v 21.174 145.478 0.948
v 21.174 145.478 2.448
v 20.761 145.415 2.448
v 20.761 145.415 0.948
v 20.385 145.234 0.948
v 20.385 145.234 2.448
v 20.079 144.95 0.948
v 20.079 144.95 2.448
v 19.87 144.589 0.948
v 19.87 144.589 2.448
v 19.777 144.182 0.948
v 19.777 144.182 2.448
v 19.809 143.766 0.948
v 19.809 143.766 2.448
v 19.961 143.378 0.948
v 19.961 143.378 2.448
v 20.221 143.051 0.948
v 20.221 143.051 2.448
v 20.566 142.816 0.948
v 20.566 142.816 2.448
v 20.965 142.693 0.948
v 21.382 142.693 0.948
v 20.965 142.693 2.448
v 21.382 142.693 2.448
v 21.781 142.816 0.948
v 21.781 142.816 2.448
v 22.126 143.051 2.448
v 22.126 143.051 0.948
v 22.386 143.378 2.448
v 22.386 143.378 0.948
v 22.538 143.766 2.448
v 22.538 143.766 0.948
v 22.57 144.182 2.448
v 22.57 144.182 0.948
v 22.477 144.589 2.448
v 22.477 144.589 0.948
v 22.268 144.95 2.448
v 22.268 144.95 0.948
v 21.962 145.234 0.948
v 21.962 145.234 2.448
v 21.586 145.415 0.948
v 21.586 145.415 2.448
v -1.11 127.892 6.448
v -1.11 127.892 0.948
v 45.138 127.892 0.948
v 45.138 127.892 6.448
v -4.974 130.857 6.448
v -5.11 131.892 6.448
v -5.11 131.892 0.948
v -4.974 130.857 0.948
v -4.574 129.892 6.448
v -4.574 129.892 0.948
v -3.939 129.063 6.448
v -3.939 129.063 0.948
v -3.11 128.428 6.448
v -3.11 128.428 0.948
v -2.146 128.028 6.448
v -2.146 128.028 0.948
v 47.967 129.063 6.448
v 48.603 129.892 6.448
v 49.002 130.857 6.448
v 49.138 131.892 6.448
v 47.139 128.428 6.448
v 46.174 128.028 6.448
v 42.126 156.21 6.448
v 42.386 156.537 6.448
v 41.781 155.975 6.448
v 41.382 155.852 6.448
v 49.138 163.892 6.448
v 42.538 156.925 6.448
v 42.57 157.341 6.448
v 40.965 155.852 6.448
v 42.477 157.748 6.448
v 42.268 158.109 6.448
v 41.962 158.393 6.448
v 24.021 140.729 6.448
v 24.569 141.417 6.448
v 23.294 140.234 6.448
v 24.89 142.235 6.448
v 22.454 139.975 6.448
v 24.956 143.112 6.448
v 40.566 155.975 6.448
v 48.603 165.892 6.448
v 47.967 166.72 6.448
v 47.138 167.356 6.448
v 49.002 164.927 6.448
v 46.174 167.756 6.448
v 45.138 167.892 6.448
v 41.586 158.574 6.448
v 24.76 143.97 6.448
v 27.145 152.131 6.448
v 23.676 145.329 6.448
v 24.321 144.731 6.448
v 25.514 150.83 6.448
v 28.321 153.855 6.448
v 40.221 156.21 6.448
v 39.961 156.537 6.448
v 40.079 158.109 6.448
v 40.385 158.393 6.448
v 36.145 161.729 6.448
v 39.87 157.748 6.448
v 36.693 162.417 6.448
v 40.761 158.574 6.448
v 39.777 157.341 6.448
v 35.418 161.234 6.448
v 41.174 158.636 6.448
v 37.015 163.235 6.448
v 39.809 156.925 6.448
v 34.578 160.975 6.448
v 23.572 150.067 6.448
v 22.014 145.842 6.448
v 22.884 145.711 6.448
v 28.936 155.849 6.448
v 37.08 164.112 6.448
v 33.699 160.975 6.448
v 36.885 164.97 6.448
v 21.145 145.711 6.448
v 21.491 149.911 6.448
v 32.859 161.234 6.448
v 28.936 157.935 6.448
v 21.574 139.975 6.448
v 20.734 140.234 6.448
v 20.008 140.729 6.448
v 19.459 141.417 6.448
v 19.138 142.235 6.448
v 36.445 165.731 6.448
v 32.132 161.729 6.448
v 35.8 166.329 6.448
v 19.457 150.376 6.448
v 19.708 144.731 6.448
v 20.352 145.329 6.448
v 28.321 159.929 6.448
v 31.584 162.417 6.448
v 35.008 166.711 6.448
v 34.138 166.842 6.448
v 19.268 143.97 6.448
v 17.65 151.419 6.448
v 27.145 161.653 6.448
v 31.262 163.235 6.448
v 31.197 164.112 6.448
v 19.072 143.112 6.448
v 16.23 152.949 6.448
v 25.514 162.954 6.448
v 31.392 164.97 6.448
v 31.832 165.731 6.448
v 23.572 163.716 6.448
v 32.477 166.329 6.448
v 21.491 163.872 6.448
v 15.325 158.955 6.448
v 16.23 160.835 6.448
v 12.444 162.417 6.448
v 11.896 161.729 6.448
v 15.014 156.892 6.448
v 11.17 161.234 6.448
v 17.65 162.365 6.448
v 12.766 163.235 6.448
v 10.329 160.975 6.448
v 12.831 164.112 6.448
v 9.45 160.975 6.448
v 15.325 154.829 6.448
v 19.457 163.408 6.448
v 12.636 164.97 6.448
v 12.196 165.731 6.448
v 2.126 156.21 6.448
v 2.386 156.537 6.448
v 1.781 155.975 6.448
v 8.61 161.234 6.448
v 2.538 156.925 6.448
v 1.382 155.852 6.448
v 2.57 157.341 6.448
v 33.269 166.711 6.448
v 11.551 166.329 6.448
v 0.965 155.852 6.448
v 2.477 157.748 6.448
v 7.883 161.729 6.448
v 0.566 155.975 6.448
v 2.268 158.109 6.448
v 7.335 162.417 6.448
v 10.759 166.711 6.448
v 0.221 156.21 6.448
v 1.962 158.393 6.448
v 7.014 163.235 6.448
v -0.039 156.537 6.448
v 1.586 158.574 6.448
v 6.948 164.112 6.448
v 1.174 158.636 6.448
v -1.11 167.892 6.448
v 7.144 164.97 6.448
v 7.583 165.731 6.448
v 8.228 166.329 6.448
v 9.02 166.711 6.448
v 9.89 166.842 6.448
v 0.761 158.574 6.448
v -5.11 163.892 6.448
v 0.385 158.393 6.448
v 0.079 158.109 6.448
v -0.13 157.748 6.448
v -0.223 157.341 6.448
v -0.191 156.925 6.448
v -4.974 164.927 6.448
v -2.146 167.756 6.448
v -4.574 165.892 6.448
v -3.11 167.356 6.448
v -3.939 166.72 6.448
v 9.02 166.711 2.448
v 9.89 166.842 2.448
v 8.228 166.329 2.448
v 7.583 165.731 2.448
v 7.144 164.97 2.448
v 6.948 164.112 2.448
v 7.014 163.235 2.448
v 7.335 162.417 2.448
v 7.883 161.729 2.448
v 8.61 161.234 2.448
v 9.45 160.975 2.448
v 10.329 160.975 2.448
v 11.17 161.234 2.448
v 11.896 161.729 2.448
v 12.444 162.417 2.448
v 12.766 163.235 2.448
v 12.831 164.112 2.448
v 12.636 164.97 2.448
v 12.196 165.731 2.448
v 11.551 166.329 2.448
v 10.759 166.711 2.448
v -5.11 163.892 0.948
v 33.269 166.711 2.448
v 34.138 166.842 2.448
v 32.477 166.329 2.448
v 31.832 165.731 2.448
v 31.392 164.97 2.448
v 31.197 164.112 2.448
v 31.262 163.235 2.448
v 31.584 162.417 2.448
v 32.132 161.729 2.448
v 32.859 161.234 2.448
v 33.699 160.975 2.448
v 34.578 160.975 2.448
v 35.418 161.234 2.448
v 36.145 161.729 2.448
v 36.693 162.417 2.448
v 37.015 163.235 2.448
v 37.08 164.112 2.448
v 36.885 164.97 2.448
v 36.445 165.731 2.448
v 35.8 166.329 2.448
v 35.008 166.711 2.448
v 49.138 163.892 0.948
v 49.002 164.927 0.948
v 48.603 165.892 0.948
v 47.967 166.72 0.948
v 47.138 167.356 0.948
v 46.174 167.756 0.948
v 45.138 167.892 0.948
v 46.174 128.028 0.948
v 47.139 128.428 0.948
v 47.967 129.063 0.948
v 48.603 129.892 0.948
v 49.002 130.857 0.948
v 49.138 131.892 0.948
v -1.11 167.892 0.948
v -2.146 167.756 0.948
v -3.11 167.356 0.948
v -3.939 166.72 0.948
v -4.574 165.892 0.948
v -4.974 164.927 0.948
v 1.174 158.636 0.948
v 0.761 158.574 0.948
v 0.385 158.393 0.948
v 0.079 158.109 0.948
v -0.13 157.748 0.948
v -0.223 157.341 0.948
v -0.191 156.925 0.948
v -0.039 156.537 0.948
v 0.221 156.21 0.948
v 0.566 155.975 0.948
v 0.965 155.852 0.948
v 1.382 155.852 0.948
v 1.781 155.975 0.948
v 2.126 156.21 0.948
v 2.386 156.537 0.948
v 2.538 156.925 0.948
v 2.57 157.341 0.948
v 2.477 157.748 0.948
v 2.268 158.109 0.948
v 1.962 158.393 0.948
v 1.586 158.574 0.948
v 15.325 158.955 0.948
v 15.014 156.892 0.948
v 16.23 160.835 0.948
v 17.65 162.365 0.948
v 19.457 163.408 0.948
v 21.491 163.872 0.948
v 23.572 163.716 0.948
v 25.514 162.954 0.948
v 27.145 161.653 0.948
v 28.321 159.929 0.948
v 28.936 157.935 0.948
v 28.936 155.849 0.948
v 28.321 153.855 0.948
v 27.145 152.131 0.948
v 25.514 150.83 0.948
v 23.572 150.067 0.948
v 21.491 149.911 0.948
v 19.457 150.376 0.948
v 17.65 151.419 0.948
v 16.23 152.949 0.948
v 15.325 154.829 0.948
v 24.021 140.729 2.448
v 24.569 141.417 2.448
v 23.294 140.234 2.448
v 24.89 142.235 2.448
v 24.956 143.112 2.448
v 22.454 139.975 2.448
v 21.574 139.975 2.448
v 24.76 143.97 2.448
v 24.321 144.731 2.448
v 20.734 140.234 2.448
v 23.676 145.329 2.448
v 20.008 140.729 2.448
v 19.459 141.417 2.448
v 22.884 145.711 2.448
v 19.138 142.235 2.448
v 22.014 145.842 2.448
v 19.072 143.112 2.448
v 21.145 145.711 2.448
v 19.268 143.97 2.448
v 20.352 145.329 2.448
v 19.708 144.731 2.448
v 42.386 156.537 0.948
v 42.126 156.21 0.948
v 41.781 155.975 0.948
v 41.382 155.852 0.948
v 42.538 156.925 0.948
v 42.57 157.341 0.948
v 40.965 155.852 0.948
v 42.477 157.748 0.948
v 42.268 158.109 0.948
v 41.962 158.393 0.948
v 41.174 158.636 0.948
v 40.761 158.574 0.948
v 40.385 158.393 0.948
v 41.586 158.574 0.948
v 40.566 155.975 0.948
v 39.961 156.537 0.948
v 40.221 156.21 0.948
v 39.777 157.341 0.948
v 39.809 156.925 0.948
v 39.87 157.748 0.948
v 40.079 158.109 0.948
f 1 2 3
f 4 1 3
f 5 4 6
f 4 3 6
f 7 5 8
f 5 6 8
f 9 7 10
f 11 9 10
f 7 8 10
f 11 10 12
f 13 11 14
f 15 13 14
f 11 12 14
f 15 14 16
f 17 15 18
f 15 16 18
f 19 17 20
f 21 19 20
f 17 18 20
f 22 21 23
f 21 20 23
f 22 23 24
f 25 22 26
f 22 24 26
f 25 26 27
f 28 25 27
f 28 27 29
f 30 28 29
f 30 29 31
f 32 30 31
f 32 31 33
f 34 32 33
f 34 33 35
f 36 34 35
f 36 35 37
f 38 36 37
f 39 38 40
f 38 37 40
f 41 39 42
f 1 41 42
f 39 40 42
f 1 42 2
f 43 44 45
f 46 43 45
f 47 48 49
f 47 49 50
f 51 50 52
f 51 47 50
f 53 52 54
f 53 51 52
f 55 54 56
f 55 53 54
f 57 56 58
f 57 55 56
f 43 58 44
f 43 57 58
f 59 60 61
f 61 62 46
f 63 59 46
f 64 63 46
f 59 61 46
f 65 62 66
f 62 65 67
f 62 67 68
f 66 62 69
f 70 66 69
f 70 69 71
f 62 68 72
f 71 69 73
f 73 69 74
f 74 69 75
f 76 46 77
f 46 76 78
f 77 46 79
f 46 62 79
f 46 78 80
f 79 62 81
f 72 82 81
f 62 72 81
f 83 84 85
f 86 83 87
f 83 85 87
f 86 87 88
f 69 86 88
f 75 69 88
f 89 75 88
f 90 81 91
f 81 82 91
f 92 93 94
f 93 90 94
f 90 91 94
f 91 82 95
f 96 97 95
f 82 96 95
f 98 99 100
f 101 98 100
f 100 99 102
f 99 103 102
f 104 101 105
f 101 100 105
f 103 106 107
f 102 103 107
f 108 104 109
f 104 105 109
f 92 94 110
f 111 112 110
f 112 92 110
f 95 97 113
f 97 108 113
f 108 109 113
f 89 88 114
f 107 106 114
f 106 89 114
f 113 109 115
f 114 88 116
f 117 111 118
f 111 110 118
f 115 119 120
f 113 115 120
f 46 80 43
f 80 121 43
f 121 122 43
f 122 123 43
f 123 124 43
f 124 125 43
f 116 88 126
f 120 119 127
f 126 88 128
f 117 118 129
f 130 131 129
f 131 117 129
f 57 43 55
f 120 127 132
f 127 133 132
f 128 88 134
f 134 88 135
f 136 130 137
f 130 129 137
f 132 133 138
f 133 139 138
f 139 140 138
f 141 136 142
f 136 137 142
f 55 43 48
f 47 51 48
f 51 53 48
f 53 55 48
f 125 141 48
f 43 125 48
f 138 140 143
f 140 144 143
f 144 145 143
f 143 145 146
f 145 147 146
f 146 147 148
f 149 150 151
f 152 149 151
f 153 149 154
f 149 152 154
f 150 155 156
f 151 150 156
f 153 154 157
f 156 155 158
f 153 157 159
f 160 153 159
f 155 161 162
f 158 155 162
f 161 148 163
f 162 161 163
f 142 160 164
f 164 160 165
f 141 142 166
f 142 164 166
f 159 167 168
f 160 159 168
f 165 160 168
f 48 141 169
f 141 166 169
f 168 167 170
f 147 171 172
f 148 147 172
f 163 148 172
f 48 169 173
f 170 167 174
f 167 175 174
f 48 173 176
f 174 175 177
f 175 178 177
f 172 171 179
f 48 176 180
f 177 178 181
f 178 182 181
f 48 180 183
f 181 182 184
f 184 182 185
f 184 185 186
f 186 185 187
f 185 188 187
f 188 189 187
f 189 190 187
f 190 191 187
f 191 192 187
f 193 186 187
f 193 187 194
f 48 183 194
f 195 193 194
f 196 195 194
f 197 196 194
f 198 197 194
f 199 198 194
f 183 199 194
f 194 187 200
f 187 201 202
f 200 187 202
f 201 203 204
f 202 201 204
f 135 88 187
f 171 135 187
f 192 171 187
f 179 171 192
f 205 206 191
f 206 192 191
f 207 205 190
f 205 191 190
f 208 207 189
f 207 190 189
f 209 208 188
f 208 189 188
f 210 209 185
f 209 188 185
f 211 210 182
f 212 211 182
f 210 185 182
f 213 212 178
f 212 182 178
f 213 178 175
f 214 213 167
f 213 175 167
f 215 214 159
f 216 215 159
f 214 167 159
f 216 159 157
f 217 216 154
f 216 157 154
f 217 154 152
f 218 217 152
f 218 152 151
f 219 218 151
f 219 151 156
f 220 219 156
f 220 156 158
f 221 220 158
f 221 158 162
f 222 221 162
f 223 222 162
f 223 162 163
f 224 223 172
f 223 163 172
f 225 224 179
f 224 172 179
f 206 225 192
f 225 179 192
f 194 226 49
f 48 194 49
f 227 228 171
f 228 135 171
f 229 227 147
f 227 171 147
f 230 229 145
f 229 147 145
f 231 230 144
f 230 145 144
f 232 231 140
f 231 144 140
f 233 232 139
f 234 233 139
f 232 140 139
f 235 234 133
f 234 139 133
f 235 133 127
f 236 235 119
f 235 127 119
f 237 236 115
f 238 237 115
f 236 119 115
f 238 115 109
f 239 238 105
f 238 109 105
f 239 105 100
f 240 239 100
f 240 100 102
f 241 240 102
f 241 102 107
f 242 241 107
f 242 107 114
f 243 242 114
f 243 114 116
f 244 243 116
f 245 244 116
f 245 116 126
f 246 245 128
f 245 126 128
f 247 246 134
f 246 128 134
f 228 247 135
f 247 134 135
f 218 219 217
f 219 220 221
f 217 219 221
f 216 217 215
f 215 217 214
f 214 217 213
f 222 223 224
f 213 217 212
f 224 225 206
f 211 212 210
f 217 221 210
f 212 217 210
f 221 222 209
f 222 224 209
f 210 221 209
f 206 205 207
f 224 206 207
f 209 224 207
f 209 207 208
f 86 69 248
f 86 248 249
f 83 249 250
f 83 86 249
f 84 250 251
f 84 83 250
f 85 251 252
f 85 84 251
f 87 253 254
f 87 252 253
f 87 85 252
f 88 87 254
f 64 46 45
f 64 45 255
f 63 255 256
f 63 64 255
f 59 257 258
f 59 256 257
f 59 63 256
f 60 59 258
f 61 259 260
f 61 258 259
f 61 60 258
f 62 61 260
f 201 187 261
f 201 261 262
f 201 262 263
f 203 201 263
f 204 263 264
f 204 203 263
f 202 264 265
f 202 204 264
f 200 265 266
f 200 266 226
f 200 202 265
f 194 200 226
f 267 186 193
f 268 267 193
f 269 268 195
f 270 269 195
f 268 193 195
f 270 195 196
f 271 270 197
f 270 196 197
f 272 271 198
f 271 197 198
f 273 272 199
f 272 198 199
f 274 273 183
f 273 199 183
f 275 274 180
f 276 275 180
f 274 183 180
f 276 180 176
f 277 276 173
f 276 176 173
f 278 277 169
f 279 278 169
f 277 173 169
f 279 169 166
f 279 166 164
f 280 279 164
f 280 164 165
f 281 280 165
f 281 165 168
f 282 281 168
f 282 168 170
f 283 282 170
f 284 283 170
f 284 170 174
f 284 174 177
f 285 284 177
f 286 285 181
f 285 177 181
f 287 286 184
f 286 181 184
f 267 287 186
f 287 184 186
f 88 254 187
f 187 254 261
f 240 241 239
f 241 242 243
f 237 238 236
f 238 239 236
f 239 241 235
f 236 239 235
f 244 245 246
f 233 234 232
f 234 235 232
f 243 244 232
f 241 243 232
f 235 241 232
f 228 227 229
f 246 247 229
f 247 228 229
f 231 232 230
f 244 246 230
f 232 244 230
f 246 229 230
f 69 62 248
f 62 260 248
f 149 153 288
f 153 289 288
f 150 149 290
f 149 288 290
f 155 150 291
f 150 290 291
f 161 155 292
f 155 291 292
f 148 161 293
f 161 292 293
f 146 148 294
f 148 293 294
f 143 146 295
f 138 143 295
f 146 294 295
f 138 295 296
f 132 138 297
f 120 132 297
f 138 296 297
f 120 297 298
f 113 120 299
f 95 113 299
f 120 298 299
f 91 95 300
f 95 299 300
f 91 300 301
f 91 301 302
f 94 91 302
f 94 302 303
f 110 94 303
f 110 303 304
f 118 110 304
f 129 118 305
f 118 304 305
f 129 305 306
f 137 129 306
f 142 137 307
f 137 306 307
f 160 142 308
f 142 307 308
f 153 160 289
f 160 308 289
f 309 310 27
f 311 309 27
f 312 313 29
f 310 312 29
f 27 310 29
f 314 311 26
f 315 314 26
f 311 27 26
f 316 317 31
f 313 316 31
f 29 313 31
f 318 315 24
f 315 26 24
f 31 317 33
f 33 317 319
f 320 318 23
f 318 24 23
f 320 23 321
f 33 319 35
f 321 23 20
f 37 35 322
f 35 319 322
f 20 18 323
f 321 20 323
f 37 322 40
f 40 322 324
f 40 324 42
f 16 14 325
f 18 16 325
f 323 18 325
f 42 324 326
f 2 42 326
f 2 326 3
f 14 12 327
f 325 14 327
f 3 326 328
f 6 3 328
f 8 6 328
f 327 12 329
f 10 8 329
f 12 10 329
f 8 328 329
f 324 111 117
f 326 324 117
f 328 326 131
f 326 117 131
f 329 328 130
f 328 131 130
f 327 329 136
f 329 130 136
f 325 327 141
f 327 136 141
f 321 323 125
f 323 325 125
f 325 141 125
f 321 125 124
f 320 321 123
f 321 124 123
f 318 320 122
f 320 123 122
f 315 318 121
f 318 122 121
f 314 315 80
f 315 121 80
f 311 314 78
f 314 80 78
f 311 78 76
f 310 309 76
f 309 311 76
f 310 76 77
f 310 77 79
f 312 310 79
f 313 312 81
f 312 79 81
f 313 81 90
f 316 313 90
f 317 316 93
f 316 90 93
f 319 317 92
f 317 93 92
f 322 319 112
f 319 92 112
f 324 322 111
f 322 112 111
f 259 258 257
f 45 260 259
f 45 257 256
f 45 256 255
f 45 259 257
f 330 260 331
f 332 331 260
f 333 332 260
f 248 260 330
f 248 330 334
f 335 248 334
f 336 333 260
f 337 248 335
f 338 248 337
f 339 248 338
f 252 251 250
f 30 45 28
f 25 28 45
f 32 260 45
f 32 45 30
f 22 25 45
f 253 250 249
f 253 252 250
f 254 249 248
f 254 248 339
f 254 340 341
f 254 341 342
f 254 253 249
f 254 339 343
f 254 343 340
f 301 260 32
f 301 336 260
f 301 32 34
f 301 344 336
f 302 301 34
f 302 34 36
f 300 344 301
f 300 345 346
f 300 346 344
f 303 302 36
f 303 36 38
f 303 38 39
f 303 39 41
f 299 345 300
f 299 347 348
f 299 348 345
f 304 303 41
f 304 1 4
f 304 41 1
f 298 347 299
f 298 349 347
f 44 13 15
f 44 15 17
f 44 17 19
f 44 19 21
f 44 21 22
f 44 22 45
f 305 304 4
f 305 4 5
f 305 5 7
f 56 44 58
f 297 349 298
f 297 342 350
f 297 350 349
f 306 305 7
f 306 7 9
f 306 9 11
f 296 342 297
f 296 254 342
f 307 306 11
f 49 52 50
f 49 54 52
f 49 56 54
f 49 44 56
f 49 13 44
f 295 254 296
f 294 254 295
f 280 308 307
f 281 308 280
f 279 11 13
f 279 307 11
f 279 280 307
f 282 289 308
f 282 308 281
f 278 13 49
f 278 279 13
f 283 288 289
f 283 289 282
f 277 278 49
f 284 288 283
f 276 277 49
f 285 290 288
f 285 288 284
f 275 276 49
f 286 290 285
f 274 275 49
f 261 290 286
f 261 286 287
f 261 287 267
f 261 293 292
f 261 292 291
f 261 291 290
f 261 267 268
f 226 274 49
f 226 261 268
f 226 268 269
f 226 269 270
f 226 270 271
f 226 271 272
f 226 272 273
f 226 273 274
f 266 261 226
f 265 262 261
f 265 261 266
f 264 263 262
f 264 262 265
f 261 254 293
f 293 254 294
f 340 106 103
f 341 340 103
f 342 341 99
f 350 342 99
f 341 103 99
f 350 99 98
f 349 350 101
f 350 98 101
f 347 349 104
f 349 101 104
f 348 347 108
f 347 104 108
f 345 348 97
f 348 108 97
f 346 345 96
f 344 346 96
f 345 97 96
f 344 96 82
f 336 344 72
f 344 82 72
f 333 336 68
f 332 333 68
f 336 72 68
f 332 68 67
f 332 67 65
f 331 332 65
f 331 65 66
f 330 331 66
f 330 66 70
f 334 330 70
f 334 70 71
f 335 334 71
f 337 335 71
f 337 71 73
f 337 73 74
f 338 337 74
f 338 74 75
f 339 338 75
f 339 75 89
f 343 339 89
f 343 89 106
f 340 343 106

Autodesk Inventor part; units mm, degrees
ref_plane "YZ Plane" through (0, 0, 0) normal (1, 0, 0) x (0, 1, 0)
ref_plane "XZ Plane" through (0, 0, 0) normal (0, 1, 0) x (-1, 0, 0)
ref_plane "XY Plane" through (0, 0, 0) normal (0, 0, 1) x (1, 0, 0)
ref_plane "Work Plane1" through (52.5141, 202.7033, 6.4479) normal (0, 0, -1) x (0, 1, 0)
sketch "Sketch1" plane through (52.5141, 202.7033, 6.4479) normal (0, 0, -1) x (0, 1, 0)
  circle A0 centre (-59.8114, -30.5) radius 1.4 construction
  circle A1 centre (-38.8114, -18.3756) radius 1.4 projected
  circle A2 centre (-38.8114, -42.6244) radius 1.4 construction
  circle A3 centre (41, 0) radius 1.65 projected
  circle A4 centre (-9, 0) radius 1.65 projected
  circle A5 centre (-9, 50) radius 1.65 projected
  circle A6 centre (41, 50) radius 1.65 projected
  circle A7 centre (16, 50) radius 1.65 projected
  circle A8 centre (-9, 25) radius 1.65 projected
  circle A9 centre (16, 0) radius 1.65 projected
  circle A10 centre (41, 25) radius 1.65 projected
  line L0 (80, 55) -> (-80, 55) projected
  line L1 (-80, 55) -> (-80, -55) projected
  line L2 (-80, -55) -> (80, -55) projected
  line L3 (80, -55) -> (80, 55) projected
  line L4 (-36.5, 0) -> (-36.5, -50) projected
  line L5 (-14, 0) -> (-36.5, 0) projected
  line L6 (-14, -5) -> (-14, 0) projected
  line L7 (72, -5) -> (-14, -5) projected
  line L8 (72, -50) -> (72, -5) projected
  line L9 (-36.5, -50) -> (72, -50) projected
  line L10 (-4, 45) -> (-4, 5) projected
  line L11 (36, 45) -> (-4, 45) projected
  line L12 (36, 5) -> (36, 45) projected
  line L13 (-4, 5) -> (36, 5) projected
  line L14 (-64.5989, -17.0433) -> (-64.5989, -57.0433) construction
  line L15 (-64.5989, -57.0433) -> (-34.5989, -57.0433) construction
  line L16 (-34.5989, -57.0433) -> (-34.5989, -17.0433) construction
  line L17 (-34.5989, -17.0433) -> (-64.5989, -17.0433) construction
  line L18 (-34.8114, -13.0433) -> (-63.8114, -13.0433)
  line L19 (-63.8114, -13.0433) -> (-63.8114, -52.6244)
  line L20 (-63.8114, -52.6244) -> (-34.8114, -52.6244)
  line L21 (-34.8114, -52.6244) -> (-34.8114, -13.0433)
  circle A11 centre (-59.8114, -30.5) radius 2.95
  circle A12 centre (-38.8114, -18.3756) radius 2.95
  circle A13 centre (-38.8114, -42.6244) radius 2.95 construction
  line L22 (-36.5, -35.1157) -> (-41.75, -35.1157) construction
  line L23 (-41.75, -35.1157) -> (-41.75, -38.5657) construction
  line L24 (-41.75, -38.5657) -> (-56.86, -38.5657) construction
  line L25 (-56.86, -38.5657) -> (-56.86, -35.1157) construction
  line L26 (-56.86, -35.1157) -> (-60.26, -35.1157) construction
  line L27 (-60.26, -35.1157) -> (-60.26, -52.0657) construction
  line L28 (-60.26, -52.0657) -> (-36.5, -52.0657) construction
  line L29 (-36.5, -52.0657) -> (-36.5, -35.1157) construction
  line L30 (-41.75, -28.3657) -> (-36.5, -28.3657) construction
  line L31 (-36.5, -28.3657) -> (-36.5, -25.0657) construction
  line L32 (-36.5, -25.0657) -> (-60.26, -25.0657) construction
  line L33 (-60.26, -25.0657) -> (-60.26, -28.3657) construction
  line L34 (-60.26, -28.3657) -> (-56.86, -28.3657) construction
  line L35 (-56.86, -28.3657) -> (-56.86, -27.0942) construction
  line L36 (-56.86, -27.0942) -> (-41.75, -27.0942) construction
  line L37 (-41.75, -27.0942) -> (-41.75, -28.3657) construction
  line L38 (-56.86, -35.1157) -> (-60.26, -35.1157) construction
  line L39 (-56.86, -38.5657) -> (-56.86, -35.1157) construction
  line L40 (-41.75, -38.5657) -> (-56.86, -38.5657) construction
  line L41 (-41.75, -35.1157) -> (-41.75, -38.5657) construction
  line L42 (-36.5, -35.1157) -> (-41.75, -35.1157) construction
  line L43 (-36.5, -35.05) -> (-36.5, -35.1157) construction
  line L44 (-36.5, -35.05) -> (-56.86, -35.05) construction
  line L45 (-36.5, -34.78) -> (-36.5, -35.05) construction
  line L46 (-36.5, -34.78) -> (-56.86, -34.78) construction
  line L47 (-36.5, -34.51) -> (-36.5, -34.78) construction
  line L48 (-36.5, -34.51) -> (-56.86, -34.51) construction
  line L49 (-36.5, -34.24) -> (-36.5, -34.51) construction
  line L50 (-36.5, -34.24) -> (-56.86, -34.24) construction
  line L51 (-36.5, -33.97) -> (-36.5, -34.24) construction
  line L52 (-36.5, -33.97) -> (-56.86, -33.97) construction
  line L53 (-36.5, -33.7) -> (-36.5, -33.97) construction
  line L54 (-36.5, -33.7) -> (-56.86, -33.7) construction
  line L55 (-36.5, -33.43) -> (-36.5, -33.7) construction
  line L56 (-36.5, -33.43) -> (-56.86, -33.43) construction
  line L57 (-36.5, -33.16) -> (-36.5, -33.43) construction
  line L58 (-36.5, -33.16) -> (-56.86, -33.16) construction
  line L59 (-36.5, -32.89) -> (-36.5, -33.16) construction
  line L60 (-36.5, -32.89) -> (-56.86, -32.89) construction
  line L61 (-36.5, -32.62) -> (-36.5, -32.89) construction
  line L62 (-36.5, -32.62) -> (-56.86, -32.62) construction
  line L63 (-36.5, -32.35) -> (-36.5, -32.62) construction
  line L64 (-36.5, -32.35) -> (-56.86, -32.35) construction
  line L65 (-36.5, -32.08) -> (-36.5, -32.35) construction
  line L66 (-36.5, -32.08) -> (-56.86, -32.08) construction
  line L67 (-36.5, -31.81) -> (-36.5, -32.08) construction
  line L68 (-36.5, -31.81) -> (-56.86, -31.81) construction
  line L69 (-36.5, -31.54) -> (-36.5, -31.81) construction
  line L70 (-36.5, -31.54) -> (-56.86, -31.54) construction
  line L71 (-36.5, -31.27) -> (-36.5, -31.54) construction
  line L72 (-36.5, -31.27) -> (-56.86, -31.27) construction
  line L73 (-36.5, -31) -> (-36.5, -31.27) construction
  line L74 (-36.5, -31) -> (-56.86, -31) construction
  line L75 (-36.5, -30.73) -> (-36.5, -31) construction
  line L76 (-36.5, -30.73) -> (-56.86, -30.73) construction
  line L77 (-36.5, -30.46) -> (-36.5, -30.73) construction
  line L78 (-36.5, -30.46) -> (-56.86, -30.46) construction
  line L79 (-36.5, -30.19) -> (-36.5, -30.46) construction
  line L80 (-36.5, -30.19) -> (-56.86, -30.19) construction
  line L81 (-36.5, -29.92) -> (-36.5, -30.19) construction
  line L82 (-36.5, -29.92) -> (-56.86, -29.92) construction
  line L83 (-36.5, -29.65) -> (-36.5, -29.92) construction
  line L84 (-36.5, -29.65) -> (-56.86, -29.65) construction
  line L85 (-36.5, -29.38) -> (-36.5, -29.65) construction
  line L86 (-36.5, -29.38) -> (-56.86, -29.38) construction
  line L87 (-36.5, -29.11) -> (-36.5, -29.38) construction
  line L88 (-36.5, -29.11) -> (-56.86, -29.11) construction
  line L89 (-36.5, -28.84) -> (-36.5, -29.11) construction
  line L90 (-36.5, -28.84) -> (-56.86, -28.84) construction
  line L91 (-36.5, -28.3657) -> (-36.5, -28.84) construction
  line L92 (-41.75, -28.3657) -> (-36.5, -28.3657) construction
  line L93 (-41.75, -27.0942) -> (-41.75, -28.3657) construction
  line L94 (-56.86, -27.0942) -> (-41.75, -27.0942) construction
  line L95 (-56.86, -28.3657) -> (-56.86, -27.0942) construction
  line L96 (-60.26, -28.3657) -> (-56.86, -28.3657) construction
  line L97 (-60.26, -35.1157) -> (-60.26, -28.3657) construction
  line L98 (-60.26, -25.0657) -> (-36.5, -25.0657) construction
  line L99 (-36.5, -25.0657) -> (-36.5, -52.0657) construction
  line L100 (-60.26, -52.0657) -> (-60.26, -25.0657) construction
  line L101 (-57.1632, -22.5233) -> (-33.4032, -22.5233) construction
  line L102 (-33.4032, -22.5233) -> (-33.4032, -49.5233) construction
  line L103 (-33.4032, -49.5233) -> (-57.1632, -49.5233) construction
  line L104 (-57.1632, -49.5233) -> (-57.1632, -22.5233) construction
  circle A14 centre (-38.8114, -42.6244) radius 2.95
  point P0 (-202.7033, -52.5141)
  point P1 (-56.7146, -27.9576)
  dimension "d0" = 4
  dimension "d2" = 4
  dimension "d3" = 4
  dimension "d4" = 5.9
  dimension "d5" = 5.9
  dimension "d6" = 5.9
  dimension "d10" = 10
extrude "Extrusion1" add sketch "Sketch1" along normal blind 4 contours L18 L21 L9 L4 A14 A12 | L4 A12 A14 L9 L21 L20 L19 L18
sketch "Sketch2" plane through (52.5141, 202.7033, 2.4479) normal (0, 0, -1) x (-1, 0, 0)
  circle A0 centre (42.6244, -38.8114) radius 2.95 projected
  circle A1 centre (18.3756, -38.8114) radius 2.95 projected
  circle A2 centre (30.5, -59.8114) radius 2.95 projected
  line L0 (13.0433, -34.8114) -> (13.0433, -63.8114) projected
  line L1 (13.0433, -63.8114) -> (52.6244, -63.8114) projected
  line L2 (52.6244, -63.8114) -> (52.6244, -34.8114) projected
  line L3 (52.6244, -34.8114) -> (13.0433, -34.8114) projected
  point P0 (52.5141, -202.7033)
extrude "Extrusion2" add sketch "Sketch2" along normal blind 1.5 contours A0 | A1 | A2 | L3 L2 L1 L0
sketch "Sketch6" plane through (52.5141, 202.7033, 0.9479) normal (0, 0, -1) x (-1, 0, 0)
  line L0 (13.0433, -34.8114) -> (13.0433, -63.8114) projected
  line L1 (13.0433, -63.8114) -> (52.6244, -63.8114) projected
  line L2 (52.6244, -63.8114) -> (52.6244, -34.8114) projected
  line L3 (52.6244, -34.8114) -> (13.0433, -34.8114) projected
  circle A0 centre (42.6244, -38.8114) radius 2.95 projected
  circle A1 centre (18.3756, -38.8114) radius 2.95 projected
  circle A2 centre (30.5, -59.8114) radius 2.95 projected
  line L4 (3.3756, -34.8114) -> (57.6244, -34.8114)
  line L5 (57.6244, -34.8114) -> (57.6244, -74.8114)
  line L6 (57.6244, -74.8114) -> (3.3756, -74.8114)
  line L7 (3.3756, -74.8114) -> (3.3756, -34.8114)
  point P0 (52.5141, -202.7033)
  dimension "d34" = 15
  dimension "d35" = 15
  dimension "d36" = 15
extrude "Extrusion6" add sketch "Sketch6" against normal up to surface (5.5 mm away) contours L0 L1 L2 L4 L5 L6 L7
sketch "Sketch7" plane through (52.5141, 202.7033, 0.9479) normal (0, 0, -1) x (-1, 0, 0)
  circle A0 centre (30.5, -59.8114) radius 2.95 projected
  circle A1 centre (18.3756, -38.8114) radius 2.95 projected
  circle A2 centre (42.6244, -38.8114) radius 2.95 projected
  line L0 (30.5, -59.8114) -> (42.6244, -38.8114)
  line L1 (42.6244, -38.8114) -> (18.3756, -38.8114)
  line L2 (18.3756, -38.8114) -> (30.5, -59.8114)
  circle A3 centre (30.5, -45.8114) radius 7
  circle A4 centre (30.5, -45.8114) radius 6.2512
  point P0 (52.5141, -202.7033)
extrude "Extrusion7" cut sketch "Sketch7" against normal through all contours A3 | A4
fillet "Fillet1" radius 4 4 edges at (49.1384, 127.8919, 3.6979) (49.1384, 167.8919, 3.6979) (-5.1103, 127.8919, 3.6979) (-5.1103, 167.8919, 3.6979)
sketch "Sketch8" plane through (52.5141, 202.7033, 0.9479) normal (0, 0, -1) x (-1, 0, 0)
  circle A0 centre (51.3406, -45.4668) radius 1.6 projected
  circle A1 centre (11.3406, -45.4668) radius 1.6 projected
  arc A2 (57.6244, -38.8114) -> (53.6244, -34.8114) centre (53.6244, -38.8114) ccw projected
  line L0 (7.3756, -34.8114) -> (53.6244, -34.8114) projected
  arc A3 (7.3756, -34.8114) -> (3.3756, -38.8114) centre (7.3756, -38.8114) ccw projected
  line L1 (3.3756, -70.8114) -> (3.3756, -38.8114) projected
  arc A4 (3.3756, -70.8114) -> (7.3756, -74.8114) centre (7.3756, -70.8114) ccw projected
  line L2 (53.6244, -74.8114) -> (7.3756, -74.8114) projected
  arc A5 (53.6244, -74.8114) -> (57.6244, -70.8114) centre (53.6244, -70.8114) ccw projected
  line L3 (57.6244, -38.8114) -> (57.6244, -70.8114) projected
  circle A6 centre (31.3406, -58.6258) radius 1.6 projected
  point P0 (52.5141, -202.7033)
hole "Hole1" at (1.1735, 157.2365, 0.9479) at (21.1735, 144.0776, 0.9479) at (41.1735, 157.2365, 0.9479) direction (0, 0, 1) diameter 2.8 end through all
properties part number "cellSTORM_v5_chiptray_new_25.4mm_0"
